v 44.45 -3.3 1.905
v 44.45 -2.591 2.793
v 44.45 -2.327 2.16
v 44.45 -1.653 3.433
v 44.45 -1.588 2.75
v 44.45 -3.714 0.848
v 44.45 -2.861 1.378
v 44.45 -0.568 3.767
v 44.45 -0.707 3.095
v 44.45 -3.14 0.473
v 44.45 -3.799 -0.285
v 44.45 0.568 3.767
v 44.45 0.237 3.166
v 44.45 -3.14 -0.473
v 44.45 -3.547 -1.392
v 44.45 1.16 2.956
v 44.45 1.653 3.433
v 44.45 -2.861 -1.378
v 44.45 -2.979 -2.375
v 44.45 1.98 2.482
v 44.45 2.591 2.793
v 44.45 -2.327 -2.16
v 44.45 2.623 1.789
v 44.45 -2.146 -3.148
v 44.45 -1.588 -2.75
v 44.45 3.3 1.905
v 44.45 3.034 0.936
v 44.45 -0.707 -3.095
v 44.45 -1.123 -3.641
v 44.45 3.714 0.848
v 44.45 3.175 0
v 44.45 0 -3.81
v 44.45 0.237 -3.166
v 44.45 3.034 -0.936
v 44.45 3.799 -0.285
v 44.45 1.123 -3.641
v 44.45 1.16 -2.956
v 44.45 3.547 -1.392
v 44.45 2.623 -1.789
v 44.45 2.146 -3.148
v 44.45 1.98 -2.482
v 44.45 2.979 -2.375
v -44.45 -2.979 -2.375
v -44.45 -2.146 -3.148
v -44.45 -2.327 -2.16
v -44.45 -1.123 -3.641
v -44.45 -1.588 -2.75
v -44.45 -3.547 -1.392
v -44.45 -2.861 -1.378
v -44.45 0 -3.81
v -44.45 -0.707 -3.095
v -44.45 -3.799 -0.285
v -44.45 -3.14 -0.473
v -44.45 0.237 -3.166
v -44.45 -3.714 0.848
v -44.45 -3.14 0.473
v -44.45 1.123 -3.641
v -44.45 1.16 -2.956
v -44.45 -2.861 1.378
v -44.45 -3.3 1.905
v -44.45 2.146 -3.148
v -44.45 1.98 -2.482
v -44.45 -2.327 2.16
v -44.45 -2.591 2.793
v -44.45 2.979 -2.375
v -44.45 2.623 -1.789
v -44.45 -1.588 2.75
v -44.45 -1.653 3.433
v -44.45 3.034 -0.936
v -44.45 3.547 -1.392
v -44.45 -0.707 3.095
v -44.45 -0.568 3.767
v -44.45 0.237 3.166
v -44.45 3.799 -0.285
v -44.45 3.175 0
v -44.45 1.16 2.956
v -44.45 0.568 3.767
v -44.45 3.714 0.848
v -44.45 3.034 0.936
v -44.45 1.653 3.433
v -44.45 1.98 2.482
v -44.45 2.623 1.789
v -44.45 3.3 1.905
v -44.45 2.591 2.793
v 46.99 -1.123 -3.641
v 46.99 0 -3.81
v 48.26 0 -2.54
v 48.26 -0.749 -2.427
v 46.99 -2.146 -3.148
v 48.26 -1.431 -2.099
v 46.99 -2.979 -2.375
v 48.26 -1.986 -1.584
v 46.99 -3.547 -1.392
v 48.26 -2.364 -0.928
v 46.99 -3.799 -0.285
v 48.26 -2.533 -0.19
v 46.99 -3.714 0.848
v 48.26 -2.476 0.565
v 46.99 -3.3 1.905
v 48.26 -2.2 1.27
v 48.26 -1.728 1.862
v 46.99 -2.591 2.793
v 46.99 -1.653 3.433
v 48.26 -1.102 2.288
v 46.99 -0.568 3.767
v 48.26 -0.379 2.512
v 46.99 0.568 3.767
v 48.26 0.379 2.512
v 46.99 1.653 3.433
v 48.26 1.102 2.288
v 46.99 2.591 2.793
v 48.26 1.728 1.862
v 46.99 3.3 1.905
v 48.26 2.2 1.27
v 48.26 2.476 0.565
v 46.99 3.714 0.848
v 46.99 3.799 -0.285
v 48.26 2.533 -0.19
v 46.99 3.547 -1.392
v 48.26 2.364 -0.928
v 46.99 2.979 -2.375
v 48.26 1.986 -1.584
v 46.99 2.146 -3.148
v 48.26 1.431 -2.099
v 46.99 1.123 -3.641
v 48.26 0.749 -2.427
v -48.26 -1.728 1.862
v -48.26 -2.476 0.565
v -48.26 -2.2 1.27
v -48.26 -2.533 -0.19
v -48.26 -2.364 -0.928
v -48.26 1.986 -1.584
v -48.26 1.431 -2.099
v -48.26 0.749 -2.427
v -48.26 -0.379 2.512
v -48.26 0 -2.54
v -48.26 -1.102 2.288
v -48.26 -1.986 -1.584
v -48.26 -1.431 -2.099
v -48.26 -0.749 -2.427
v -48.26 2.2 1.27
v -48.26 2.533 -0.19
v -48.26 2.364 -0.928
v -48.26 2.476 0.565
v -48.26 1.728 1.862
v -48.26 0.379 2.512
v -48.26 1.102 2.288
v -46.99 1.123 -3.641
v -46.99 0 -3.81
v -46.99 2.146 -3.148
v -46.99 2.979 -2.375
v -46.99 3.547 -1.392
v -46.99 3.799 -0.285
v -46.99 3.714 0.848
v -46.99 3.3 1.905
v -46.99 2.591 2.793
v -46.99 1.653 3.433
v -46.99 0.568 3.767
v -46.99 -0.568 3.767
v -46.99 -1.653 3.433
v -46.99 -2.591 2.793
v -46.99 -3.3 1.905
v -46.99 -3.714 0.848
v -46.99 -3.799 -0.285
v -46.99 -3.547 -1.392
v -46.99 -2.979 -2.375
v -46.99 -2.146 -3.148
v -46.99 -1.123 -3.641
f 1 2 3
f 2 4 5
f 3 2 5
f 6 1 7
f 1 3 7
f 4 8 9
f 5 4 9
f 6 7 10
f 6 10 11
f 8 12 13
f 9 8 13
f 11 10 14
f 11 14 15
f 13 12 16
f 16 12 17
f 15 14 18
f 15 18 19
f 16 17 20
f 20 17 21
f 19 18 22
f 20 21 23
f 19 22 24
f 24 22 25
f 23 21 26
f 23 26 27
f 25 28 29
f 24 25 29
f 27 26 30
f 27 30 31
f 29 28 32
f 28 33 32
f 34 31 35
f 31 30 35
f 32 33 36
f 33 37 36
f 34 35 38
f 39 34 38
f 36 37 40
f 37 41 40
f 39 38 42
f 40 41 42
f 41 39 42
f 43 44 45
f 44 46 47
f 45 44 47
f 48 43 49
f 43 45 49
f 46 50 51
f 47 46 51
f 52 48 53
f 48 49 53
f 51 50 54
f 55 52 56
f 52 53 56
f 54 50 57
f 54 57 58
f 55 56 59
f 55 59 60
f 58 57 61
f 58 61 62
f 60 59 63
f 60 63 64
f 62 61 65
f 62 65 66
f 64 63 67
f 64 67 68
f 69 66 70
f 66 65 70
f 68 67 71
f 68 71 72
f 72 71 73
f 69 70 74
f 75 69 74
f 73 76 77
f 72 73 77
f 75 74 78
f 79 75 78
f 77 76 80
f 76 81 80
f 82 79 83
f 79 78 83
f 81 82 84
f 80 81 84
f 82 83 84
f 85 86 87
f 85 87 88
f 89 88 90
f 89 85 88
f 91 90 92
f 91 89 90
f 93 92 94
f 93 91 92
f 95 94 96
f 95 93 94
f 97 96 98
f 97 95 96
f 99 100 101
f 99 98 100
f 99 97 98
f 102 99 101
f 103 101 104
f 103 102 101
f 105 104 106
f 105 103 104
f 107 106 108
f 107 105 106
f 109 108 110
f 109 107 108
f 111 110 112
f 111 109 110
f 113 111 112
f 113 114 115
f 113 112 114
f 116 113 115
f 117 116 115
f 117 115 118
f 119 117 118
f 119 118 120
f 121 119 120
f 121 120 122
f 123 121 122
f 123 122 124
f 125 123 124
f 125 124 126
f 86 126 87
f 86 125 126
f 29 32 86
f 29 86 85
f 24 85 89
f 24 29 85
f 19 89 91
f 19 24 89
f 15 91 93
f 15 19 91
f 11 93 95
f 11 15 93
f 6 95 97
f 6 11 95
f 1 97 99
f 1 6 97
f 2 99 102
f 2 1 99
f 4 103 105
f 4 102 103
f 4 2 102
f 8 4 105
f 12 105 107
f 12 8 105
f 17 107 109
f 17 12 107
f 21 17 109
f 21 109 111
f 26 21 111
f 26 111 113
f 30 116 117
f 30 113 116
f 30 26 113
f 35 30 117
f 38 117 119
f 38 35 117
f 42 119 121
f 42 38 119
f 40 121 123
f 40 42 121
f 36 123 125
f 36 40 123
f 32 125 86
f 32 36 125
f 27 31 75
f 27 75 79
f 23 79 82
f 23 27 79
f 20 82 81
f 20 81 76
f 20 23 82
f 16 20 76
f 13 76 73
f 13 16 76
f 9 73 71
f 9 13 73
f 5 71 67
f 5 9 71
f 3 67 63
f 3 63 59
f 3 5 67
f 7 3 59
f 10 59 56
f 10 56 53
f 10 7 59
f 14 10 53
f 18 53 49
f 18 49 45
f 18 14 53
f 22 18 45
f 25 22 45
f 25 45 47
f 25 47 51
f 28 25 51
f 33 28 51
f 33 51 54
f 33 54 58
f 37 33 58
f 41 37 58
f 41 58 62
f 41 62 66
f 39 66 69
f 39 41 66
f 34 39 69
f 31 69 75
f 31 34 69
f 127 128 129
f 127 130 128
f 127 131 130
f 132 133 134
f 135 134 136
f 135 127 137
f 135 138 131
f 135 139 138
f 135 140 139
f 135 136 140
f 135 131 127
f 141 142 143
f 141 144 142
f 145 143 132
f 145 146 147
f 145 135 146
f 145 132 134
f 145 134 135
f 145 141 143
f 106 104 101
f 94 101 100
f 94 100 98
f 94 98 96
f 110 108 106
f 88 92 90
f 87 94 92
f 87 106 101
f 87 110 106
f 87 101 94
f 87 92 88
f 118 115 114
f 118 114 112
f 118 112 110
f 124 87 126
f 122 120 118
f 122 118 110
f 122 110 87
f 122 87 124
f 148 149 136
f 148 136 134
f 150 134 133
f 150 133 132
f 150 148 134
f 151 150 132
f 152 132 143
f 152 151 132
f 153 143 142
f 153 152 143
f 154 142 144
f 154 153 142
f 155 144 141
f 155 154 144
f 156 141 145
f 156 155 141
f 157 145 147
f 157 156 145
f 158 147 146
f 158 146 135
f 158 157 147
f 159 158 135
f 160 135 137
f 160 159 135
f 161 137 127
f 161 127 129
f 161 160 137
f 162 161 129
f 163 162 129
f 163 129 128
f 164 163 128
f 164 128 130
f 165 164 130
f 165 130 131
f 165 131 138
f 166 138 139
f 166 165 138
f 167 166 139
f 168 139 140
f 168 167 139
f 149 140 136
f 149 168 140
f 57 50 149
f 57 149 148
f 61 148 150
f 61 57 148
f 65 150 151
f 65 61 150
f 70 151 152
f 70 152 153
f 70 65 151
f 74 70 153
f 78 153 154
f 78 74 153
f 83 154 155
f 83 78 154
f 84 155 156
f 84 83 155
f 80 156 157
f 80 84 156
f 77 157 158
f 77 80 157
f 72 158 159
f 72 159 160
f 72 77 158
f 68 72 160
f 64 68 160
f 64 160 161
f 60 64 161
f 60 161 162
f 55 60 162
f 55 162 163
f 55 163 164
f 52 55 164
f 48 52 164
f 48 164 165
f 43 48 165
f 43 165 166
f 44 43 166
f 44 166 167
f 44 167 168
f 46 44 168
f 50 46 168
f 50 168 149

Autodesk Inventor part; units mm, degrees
ref_plane "YZ Plane" through (0, 0, 0) normal (1, 0, 0) x (0, 1, 0)
ref_plane "XZ Plane" through (0, 0, 0) normal (0, 1, 0) x (-1, 0, 0)
ref_plane "XY Plane" through (0, 0, 0) normal (0, 0, 1) x (1, 0, 0)
sketch "Sketch1" plane through (0, 0, 0) normal (1, 0, 0) x (0, 1, 0)
  circle A0 centre (0, 0) radius 3.175
  dimension "d0" = 6.35
extrude "Extrusion1" add sketch "Sketch1" along normal mid plane 88.9
sketch "Sketch2" plane through (44.45, 0, 0) normal (1, 0, 0) x (0, 0, -1)
  circle A0 centre (0, 0) radius 3.81
  dimension "d3" = 7.62
extrude "Extrusion2" add sketch "Sketch2" along normal blind 3.81
chamfer "Chamfer1" distance 1.27 angle 45 1 edges at (48.26, 0, 3.81)
mirror "Mirror1" about plane through (0, 0, 0) normal (1, 0, 0) of "Extrusion2", "Chamfer1"
properties part number "PivetRob(H)"
